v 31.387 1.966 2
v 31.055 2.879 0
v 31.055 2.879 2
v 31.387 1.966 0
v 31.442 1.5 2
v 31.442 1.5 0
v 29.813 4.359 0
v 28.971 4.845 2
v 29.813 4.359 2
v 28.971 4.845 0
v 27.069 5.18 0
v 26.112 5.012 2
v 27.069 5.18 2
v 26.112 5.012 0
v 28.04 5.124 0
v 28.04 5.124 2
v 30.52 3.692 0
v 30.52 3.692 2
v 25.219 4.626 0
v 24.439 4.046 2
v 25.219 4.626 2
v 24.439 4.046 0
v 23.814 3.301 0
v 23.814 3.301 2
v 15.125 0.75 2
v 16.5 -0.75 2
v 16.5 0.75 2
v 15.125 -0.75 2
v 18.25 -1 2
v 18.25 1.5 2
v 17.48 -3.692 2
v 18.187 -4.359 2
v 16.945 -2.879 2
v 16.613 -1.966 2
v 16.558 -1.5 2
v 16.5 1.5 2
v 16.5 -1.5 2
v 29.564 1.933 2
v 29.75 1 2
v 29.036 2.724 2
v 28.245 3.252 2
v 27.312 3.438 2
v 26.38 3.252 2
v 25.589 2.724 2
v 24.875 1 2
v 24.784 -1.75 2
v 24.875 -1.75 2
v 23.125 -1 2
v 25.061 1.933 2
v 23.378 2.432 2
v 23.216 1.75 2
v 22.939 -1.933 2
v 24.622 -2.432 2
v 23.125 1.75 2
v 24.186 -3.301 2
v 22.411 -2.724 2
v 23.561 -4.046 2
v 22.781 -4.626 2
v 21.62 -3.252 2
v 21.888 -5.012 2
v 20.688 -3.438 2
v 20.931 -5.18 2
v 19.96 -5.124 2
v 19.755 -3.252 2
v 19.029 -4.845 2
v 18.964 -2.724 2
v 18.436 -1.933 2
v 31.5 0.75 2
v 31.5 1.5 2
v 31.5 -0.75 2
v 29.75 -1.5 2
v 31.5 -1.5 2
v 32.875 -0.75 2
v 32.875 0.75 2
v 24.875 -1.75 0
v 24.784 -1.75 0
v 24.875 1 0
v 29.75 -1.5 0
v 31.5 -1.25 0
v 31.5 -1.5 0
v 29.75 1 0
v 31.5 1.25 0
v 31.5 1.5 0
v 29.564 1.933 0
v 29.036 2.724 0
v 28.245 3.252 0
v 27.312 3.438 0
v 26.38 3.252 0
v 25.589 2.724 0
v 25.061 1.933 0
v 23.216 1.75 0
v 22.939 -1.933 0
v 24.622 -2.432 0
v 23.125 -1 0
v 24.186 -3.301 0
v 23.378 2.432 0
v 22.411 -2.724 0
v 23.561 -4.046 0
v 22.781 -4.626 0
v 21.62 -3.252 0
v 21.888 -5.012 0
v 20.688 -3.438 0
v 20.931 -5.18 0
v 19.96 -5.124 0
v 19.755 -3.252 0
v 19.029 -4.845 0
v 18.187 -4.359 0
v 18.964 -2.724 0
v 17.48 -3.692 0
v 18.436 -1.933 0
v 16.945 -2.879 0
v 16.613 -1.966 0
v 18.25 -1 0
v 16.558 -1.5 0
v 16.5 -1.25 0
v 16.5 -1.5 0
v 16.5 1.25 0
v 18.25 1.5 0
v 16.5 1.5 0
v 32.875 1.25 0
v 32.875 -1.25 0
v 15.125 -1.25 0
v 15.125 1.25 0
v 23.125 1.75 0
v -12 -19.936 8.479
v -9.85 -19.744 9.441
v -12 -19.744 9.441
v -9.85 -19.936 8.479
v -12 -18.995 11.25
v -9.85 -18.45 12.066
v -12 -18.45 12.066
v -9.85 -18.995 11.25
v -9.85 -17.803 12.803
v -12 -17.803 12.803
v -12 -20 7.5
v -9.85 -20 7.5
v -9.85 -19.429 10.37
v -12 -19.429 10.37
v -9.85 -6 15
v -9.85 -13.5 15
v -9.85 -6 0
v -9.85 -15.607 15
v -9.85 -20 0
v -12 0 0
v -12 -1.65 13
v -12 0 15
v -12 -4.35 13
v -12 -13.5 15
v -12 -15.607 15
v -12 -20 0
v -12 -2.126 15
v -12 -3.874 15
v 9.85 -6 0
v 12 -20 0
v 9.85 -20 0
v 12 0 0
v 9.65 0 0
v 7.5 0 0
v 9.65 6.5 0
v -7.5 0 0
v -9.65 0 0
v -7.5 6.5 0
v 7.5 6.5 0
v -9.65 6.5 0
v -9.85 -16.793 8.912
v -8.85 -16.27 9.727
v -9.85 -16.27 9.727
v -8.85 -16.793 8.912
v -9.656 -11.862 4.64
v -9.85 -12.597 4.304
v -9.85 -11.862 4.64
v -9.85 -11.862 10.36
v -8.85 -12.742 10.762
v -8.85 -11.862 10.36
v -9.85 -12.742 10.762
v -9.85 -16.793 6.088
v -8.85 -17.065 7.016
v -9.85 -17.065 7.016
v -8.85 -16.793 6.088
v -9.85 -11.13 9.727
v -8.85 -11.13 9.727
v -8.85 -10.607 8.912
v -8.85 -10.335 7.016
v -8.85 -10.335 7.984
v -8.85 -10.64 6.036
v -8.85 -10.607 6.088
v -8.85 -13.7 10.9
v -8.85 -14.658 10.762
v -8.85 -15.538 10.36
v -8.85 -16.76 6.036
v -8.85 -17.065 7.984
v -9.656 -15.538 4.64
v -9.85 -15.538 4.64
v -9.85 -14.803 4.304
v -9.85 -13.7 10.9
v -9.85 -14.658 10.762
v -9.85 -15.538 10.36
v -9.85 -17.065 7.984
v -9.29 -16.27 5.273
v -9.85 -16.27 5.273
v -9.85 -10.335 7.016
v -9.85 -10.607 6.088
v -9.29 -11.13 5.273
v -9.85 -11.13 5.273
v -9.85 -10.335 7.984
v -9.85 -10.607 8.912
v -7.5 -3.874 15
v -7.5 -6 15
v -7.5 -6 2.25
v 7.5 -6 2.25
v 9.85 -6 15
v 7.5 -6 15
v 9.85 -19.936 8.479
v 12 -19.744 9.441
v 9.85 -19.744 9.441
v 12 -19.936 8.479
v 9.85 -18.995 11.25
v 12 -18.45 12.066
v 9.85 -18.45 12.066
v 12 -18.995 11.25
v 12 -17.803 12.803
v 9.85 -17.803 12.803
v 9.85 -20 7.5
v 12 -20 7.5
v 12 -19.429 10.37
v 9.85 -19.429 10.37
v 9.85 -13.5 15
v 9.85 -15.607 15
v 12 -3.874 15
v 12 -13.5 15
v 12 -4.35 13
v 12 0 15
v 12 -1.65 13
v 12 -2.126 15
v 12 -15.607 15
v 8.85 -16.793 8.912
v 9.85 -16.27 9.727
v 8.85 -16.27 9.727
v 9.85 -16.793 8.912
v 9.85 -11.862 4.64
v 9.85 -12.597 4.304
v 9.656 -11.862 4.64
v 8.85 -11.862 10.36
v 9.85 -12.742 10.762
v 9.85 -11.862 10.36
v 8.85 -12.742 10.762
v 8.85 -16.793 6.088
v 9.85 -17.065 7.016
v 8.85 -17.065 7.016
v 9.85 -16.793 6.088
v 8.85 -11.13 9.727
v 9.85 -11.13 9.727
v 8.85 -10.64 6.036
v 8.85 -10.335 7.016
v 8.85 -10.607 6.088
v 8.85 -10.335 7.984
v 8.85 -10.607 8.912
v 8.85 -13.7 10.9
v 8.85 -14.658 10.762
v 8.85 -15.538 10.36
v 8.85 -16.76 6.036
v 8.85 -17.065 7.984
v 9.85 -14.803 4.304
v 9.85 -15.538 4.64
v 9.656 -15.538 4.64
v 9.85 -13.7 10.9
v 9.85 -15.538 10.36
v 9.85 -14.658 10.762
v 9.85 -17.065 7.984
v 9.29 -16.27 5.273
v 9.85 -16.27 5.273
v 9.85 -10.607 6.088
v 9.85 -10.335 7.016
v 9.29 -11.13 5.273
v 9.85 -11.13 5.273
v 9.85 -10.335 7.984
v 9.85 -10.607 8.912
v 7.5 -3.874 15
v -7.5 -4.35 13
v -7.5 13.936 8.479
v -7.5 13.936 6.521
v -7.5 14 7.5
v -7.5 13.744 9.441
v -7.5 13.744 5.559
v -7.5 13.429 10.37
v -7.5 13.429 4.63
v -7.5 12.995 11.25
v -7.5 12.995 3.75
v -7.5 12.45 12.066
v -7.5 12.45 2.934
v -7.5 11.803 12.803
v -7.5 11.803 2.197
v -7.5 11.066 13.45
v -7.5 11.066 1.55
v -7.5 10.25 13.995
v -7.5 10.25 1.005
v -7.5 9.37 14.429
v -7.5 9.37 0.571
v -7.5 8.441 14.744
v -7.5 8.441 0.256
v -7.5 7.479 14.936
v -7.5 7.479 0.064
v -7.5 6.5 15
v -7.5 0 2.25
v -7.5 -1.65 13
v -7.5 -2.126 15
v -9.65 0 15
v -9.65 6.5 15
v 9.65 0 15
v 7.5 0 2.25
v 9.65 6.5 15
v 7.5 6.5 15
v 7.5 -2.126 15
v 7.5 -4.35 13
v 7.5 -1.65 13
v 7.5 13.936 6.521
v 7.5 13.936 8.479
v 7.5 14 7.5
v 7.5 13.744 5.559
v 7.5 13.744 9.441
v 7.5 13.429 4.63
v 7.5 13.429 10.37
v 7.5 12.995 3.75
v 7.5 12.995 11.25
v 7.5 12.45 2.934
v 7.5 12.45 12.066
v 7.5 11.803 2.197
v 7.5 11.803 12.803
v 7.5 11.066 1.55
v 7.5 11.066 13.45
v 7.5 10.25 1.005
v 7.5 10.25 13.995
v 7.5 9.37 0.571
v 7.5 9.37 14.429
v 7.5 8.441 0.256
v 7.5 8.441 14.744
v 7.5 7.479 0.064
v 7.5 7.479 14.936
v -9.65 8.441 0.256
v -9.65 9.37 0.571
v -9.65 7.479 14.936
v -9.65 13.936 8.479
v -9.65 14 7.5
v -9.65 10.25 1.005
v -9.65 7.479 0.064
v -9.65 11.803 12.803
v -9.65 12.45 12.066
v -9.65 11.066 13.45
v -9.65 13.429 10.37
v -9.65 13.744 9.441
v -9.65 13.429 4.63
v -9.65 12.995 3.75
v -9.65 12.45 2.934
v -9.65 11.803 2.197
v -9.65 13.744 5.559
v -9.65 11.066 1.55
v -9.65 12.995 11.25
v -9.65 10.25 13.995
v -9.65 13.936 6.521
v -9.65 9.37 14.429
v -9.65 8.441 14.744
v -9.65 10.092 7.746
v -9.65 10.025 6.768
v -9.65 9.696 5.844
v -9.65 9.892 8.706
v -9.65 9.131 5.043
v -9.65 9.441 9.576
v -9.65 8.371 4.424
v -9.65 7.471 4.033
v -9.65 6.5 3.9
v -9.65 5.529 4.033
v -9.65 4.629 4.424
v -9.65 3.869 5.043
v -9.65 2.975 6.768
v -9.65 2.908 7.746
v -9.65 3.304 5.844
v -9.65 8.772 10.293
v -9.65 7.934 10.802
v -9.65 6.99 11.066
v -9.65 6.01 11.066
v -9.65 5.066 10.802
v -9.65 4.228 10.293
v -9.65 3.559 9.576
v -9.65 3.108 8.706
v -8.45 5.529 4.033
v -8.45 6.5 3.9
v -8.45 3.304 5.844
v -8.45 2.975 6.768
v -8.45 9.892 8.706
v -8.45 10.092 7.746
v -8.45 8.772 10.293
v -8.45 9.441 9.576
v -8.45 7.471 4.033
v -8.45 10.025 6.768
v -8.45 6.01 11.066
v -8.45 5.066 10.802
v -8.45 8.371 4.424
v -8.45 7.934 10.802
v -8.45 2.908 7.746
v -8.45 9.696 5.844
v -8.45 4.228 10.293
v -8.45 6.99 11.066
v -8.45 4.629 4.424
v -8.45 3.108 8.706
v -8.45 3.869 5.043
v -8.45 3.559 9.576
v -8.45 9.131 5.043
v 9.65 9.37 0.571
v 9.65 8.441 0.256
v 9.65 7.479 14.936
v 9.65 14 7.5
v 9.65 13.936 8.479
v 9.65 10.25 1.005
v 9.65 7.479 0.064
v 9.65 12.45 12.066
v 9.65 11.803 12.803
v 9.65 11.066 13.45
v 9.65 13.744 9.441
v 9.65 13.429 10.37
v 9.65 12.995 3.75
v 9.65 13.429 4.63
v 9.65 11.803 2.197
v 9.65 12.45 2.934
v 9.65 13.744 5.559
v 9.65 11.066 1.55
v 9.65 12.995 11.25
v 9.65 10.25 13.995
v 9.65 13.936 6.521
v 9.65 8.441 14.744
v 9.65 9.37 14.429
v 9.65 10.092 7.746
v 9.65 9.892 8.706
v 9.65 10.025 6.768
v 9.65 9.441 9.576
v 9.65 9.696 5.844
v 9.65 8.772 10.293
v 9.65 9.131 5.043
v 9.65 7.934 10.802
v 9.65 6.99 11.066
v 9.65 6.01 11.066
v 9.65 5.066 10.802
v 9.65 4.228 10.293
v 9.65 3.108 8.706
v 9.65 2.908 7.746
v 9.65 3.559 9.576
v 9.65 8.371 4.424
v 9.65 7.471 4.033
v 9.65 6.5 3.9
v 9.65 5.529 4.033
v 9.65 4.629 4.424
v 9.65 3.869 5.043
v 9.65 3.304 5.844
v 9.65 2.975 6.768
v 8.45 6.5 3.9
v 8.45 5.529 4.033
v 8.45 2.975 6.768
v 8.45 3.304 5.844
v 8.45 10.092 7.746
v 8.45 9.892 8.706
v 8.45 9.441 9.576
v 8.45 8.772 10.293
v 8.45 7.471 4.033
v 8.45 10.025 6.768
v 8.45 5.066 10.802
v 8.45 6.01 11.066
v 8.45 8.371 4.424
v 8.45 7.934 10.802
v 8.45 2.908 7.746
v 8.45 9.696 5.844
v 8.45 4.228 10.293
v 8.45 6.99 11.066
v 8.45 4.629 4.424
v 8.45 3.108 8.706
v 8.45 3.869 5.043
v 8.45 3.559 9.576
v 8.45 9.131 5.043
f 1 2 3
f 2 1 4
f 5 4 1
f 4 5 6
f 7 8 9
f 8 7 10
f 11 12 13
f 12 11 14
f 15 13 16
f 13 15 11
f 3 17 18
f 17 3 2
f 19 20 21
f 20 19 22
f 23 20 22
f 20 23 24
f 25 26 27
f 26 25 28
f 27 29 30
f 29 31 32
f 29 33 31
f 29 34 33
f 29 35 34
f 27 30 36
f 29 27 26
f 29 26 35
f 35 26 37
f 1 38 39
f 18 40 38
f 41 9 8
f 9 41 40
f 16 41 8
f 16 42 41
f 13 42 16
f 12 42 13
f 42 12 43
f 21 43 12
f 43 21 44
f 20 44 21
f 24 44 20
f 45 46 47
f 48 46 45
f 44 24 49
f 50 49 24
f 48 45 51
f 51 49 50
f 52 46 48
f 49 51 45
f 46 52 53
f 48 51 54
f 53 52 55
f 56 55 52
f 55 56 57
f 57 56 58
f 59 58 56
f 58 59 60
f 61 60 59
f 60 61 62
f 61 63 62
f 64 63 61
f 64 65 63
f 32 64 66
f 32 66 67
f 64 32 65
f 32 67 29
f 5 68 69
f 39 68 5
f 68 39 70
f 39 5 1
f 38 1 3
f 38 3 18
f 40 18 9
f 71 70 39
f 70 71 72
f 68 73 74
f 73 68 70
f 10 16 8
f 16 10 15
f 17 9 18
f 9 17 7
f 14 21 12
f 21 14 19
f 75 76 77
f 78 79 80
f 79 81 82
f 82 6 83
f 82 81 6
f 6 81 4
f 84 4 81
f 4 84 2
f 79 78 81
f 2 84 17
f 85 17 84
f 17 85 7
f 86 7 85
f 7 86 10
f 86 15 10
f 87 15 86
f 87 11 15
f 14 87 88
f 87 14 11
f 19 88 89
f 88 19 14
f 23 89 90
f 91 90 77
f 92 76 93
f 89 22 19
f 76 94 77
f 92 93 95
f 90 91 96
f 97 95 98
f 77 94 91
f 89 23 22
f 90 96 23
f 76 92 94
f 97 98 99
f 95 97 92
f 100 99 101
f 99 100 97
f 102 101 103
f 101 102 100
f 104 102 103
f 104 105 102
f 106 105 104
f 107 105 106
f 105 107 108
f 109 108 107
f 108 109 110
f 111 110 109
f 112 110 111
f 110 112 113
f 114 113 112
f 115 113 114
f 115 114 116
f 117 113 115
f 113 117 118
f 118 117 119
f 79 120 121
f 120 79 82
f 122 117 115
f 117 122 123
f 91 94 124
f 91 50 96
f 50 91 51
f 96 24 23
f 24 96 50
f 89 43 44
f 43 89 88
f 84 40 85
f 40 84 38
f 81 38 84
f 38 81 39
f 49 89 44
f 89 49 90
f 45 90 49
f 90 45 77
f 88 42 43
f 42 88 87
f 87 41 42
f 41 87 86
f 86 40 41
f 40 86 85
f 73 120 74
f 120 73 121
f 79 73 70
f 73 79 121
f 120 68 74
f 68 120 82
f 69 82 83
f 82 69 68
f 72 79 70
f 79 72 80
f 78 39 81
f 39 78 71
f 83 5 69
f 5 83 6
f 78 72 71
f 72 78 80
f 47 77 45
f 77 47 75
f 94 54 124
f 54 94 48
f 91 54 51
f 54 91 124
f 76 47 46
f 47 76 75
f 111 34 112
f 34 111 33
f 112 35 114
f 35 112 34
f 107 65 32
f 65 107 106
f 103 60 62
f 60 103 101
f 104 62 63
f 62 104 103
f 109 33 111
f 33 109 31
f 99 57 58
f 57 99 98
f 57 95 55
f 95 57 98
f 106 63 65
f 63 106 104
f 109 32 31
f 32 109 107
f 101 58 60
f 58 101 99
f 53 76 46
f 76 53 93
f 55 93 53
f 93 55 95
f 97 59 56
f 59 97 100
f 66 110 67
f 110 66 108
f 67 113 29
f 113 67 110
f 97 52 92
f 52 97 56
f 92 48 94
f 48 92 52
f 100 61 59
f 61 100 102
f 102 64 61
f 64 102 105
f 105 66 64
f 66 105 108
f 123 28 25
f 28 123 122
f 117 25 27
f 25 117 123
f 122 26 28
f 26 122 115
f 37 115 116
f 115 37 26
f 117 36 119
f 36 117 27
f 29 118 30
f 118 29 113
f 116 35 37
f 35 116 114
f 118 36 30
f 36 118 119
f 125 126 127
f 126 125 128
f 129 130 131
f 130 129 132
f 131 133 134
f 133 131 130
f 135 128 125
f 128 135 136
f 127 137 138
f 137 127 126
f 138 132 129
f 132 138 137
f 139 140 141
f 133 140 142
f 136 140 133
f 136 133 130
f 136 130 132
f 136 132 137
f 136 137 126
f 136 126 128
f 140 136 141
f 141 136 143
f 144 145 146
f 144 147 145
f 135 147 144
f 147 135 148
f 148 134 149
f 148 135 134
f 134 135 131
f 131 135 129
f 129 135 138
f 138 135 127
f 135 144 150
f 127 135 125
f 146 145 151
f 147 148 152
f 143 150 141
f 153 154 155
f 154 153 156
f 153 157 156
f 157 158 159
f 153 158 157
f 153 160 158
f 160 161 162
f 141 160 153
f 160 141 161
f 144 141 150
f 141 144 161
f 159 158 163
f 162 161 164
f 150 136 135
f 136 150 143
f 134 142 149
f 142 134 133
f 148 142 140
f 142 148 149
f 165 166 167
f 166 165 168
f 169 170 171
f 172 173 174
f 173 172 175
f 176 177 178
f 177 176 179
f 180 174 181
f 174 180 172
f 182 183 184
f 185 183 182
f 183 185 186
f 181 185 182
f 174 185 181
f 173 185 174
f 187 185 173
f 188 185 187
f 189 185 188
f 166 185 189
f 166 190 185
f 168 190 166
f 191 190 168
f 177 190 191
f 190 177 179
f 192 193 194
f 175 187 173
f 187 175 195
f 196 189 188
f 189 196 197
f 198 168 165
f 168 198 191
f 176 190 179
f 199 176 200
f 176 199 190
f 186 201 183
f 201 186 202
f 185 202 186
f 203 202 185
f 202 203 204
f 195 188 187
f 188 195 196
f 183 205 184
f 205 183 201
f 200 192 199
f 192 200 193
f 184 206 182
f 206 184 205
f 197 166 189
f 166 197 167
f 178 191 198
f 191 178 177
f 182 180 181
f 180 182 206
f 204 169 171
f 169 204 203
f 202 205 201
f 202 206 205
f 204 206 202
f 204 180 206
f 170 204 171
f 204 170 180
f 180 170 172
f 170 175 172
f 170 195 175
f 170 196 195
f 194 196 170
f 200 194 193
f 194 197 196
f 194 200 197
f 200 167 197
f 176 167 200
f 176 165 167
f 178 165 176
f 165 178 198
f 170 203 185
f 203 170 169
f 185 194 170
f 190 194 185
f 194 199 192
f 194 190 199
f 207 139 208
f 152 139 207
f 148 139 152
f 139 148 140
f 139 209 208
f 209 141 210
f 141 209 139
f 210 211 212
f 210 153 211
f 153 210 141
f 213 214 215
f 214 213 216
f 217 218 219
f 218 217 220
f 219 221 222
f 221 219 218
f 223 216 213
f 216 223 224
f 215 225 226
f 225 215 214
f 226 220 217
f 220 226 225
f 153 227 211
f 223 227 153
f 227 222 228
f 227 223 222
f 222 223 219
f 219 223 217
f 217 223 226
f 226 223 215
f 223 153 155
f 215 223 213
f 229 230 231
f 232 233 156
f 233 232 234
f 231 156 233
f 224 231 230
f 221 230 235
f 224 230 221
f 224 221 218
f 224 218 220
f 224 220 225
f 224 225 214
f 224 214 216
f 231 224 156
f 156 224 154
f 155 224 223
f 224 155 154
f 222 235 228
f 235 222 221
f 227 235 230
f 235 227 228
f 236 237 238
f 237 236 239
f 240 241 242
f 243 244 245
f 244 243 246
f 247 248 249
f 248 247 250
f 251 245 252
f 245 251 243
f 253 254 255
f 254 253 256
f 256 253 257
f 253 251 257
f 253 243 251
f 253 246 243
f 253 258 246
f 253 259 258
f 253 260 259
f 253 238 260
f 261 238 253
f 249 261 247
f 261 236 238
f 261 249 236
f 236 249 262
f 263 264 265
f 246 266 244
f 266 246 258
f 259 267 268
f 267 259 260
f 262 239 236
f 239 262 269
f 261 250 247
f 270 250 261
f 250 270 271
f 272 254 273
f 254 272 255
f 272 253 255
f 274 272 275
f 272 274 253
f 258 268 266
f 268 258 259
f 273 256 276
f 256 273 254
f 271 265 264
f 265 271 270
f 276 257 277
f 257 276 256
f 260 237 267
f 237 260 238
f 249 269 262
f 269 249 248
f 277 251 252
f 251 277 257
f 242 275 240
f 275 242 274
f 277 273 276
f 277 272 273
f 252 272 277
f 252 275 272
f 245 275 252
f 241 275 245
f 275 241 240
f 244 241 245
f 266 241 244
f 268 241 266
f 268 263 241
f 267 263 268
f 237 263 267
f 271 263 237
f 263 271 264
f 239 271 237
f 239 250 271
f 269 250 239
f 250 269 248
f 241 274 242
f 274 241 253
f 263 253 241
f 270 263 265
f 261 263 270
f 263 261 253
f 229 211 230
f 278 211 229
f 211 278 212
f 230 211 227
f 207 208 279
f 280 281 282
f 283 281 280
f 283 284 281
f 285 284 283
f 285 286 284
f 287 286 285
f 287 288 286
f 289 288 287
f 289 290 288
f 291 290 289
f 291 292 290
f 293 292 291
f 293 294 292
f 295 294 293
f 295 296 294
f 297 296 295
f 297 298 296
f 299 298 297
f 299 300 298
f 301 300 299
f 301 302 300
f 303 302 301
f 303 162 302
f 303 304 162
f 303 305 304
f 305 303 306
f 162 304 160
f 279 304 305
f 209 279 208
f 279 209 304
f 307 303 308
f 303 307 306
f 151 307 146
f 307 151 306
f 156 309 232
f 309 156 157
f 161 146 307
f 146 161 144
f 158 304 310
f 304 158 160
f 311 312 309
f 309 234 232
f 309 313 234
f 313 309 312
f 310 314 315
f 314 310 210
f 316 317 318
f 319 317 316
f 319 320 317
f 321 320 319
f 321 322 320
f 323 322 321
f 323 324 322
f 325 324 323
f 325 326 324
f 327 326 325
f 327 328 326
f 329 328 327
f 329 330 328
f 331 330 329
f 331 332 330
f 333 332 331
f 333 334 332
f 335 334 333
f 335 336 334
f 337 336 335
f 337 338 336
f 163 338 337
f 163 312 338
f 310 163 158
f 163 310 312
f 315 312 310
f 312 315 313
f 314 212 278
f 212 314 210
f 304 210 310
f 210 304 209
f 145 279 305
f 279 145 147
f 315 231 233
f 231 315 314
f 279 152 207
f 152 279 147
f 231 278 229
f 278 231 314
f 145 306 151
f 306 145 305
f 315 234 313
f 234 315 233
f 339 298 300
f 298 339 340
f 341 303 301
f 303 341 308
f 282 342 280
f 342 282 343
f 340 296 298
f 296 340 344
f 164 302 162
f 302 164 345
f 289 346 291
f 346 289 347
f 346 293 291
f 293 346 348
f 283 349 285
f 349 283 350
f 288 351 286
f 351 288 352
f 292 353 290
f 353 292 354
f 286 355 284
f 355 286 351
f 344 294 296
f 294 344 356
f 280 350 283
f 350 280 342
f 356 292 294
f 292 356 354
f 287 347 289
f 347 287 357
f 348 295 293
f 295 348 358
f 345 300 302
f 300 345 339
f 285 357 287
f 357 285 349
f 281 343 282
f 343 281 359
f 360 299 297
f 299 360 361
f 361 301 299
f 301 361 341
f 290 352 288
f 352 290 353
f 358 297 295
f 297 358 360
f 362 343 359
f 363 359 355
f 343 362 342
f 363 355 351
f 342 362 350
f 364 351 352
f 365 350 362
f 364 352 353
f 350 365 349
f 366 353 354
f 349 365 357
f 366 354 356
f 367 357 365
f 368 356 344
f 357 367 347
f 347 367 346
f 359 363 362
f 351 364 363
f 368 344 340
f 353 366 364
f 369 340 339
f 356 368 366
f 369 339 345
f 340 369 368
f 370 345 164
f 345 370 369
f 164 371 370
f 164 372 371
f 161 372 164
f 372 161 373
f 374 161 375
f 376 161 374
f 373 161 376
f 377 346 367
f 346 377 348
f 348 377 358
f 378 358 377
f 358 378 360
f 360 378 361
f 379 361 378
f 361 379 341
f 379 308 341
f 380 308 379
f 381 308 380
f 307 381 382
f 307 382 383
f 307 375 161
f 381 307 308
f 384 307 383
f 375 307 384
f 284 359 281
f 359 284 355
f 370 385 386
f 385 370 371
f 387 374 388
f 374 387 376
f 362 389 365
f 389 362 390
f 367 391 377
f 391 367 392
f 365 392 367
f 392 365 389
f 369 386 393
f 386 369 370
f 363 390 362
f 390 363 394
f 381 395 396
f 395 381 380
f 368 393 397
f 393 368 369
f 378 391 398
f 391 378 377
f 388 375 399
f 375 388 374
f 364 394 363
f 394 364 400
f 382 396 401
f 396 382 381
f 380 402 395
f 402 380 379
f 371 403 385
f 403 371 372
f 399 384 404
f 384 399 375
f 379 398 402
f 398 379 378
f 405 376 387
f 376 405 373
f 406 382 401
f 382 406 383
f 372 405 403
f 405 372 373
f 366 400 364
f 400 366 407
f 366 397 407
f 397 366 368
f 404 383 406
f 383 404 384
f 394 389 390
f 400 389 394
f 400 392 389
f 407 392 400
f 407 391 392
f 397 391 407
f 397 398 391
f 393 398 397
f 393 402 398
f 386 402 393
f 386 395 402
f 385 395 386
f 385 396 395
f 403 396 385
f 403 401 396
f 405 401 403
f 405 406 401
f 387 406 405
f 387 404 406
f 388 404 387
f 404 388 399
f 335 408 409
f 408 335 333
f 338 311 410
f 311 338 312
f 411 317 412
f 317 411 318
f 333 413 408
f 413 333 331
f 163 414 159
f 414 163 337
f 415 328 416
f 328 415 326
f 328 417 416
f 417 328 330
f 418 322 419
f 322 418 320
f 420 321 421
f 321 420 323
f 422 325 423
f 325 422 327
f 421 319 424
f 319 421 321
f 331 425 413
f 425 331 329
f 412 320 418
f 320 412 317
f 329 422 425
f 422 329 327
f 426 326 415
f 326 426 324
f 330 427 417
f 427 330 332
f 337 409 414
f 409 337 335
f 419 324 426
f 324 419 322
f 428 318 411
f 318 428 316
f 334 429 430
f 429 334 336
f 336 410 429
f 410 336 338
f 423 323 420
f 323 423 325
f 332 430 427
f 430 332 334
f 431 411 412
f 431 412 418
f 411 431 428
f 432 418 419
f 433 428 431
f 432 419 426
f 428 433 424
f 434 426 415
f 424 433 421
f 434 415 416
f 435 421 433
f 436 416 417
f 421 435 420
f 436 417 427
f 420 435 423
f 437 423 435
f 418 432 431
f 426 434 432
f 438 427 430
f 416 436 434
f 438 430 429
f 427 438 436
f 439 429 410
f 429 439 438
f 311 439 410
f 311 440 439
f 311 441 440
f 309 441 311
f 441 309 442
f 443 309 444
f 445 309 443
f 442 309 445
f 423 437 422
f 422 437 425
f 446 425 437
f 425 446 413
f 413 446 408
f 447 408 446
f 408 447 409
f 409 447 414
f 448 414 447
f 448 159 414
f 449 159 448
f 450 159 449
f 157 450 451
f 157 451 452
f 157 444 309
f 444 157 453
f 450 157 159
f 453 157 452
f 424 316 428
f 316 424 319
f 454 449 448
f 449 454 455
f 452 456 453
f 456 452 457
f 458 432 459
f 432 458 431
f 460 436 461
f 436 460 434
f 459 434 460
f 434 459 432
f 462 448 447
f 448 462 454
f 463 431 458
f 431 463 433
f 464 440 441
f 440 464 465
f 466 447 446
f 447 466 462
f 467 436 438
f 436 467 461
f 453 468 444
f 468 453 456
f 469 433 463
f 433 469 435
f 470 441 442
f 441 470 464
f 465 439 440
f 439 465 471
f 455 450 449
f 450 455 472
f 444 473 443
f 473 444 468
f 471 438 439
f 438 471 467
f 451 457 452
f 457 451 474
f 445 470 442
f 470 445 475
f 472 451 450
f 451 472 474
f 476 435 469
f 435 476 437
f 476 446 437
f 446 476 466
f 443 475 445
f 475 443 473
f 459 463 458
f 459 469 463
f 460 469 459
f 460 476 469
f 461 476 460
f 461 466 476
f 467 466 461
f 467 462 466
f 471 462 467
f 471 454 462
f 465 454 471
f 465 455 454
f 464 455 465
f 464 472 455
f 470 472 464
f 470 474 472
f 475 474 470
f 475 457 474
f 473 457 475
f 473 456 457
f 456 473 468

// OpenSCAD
// file: parameters.scad
tolerance = .2;

outer_width = 24;
outer_height = 15;

mid_depth = 6;

wall_thickness = 2.25;

key_diameter = 7;
key_depth = 1.1;

clip_thickness = 2;
clip_curve_thickness = 1.75;

_trim = 1;

$fa = 3;
$fs = 1;
// main file
include<parameters.scad>;

module notch_profile(with_tolerance=false) {
    polygon([
        [clip_thickness,
         -1.25 - (with_tolerance ? tolerance/2 : 0)],
        [(with_tolerance ? -.1 : 0),
         -.75 - (with_tolerance ? tolerance/2 : 0)],
        [(with_tolerance ? -.1 : 0),
         .75 + (with_tolerance ? tolerance/2 : 0)],
        [clip_thickness,
         1.25 + (with_tolerance ? tolerance/2 : 0)]
    ]);
}

module link_back() {
    union()
    translate([0, 0, outer_height/2])
    for(n=[0, 1])
    mirror([n, 0, 0])
    translate([-outer_width/2, 0, 0])
    union() {
        translate([0, _trim, 0])
        union() {
            difference() {
                translate([0, -outer_height/2, 0])
                rotate([0, 90, 0])
                cylinder(d=outer_height, h=wall_thickness-tolerance/2);

                translate([-.1, -outer_height/2, -outer_height/2])
                cube([wall_thickness+.2, outer_height/2, outer_height]);
            }

            translate([0, -outer_height, -outer_height/2])
            cube([wall_thickness-tolerance/2, outer_height/2, outer_height/2]);

            radius = (outer_height/2);
            translate([0, -(radius*(1+cos(45))), radius*sin(45)])
            rotate([90, 0, 90])
            linear_extrude(height=wall_thickness-tolerance/2)
            polygon([
                [0, 0],
                [radius*(1-sin(45)), radius*(1-sin(45))],
                [radius*cos(45), radius*(1-sin(45))],
                [radius*cos(45), 0]
            ]);
        }

        translate([0, -outer_height/2, -outer_height/2])
        cube([wall_thickness-tolerance/2, outer_height/2, outer_height]);

        // key
        translate([0, -outer_height/2-tolerance, 0])
        rotate([0, 90, 0])
        translate([0, 0, wall_thickness-.1])
        difference() {
            cylinder(d=key_diameter-tolerance, h=key_depth+.1-tolerance);

            translate([-2, -5, 3])
            rotate([0, 30, 0])
            cube([10,10,1]);
        }
    }
}

module link_mid() {
    translate([0, -mid_depth, 0])
    difference() {
        union() {
            translate([0, 0, outer_height/2])
            for(n=[0, 1])
            mirror([n, 0, 0])
            translate([-outer_width/2, 0, -outer_height/2])
            cube([wall_thickness * 2, mid_depth, outer_height]);

            translate([-outer_width/2, 0, 0])
            cube([outer_width, mid_depth, wall_thickness]);
        }

        translate([-outer_width/2-.5, mid_depth/2, outer_height])
        rotate([0, 90, 0])
        linear_extrude(height=outer_width+1)
        notch_profile(true);
    }
}

module link_front() {
    union()
    translate([0, 0, outer_height/2])
    for(n=[0, 1])
    mirror([n, 0, 0])
    translate([-outer_width/2 + wall_thickness, 0, 0])
    difference() {
        union() {
            translate([0, -_trim, 0])
            difference() {
                translate([tolerance/2, outer_height/2, 0])
                rotate([0, 90, 0])
                cylinder(d=outer_height, h=wall_thickness-tolerance/2);

                translate([tolerance-.1, 0, -outer_height/2])
                cube([wall_thickness-tolerance+.2, outer_height/2, outer_height]);
            }

            translate([tolerance/2, 0, -outer_height/2])
            cube([wall_thickness-tolerance/2, outer_height/2-_trim, outer_height]);
        }

        // keyhole
        translate([0, outer_height/2-_trim, 0])
        rotate([0, 90, 0])
        translate([0, 0, -.1])
        cylinder(d=key_diameter+tolerance, h=key_depth+.1+tolerance);
    }
}

module clip() {
    union() {
        for(r=[0, 180])
        rotate([0, 0, r]) {
            translate([outer_width/2-wall_thickness*2.5, 0, clip_thickness])
            rotate([0, 90, 0])
            linear_extrude(height=wall_thickness+.25)
            notch_profile(false);

            translate([outer_width/2-wall_thickness*2-clip_curve_thickness, -1.5, 0])
            cube([clip_curve_thickness, 3, clip_thickness]);

            translate([-clip_curve_thickness/2, -clip_curve_thickness, 0])
            cube([clip_curve_thickness, clip_curve_thickness*2, clip_thickness]);

            cyl_radius=(outer_width-wall_thickness*4+clip_curve_thickness)/4;

            translate([cyl_radius-clip_curve_thickness/2, 1, 0])
            difference() {
                cylinder(r=cyl_radius, h=clip_thickness);

                translate([0, 0, -.1])
                cylinder(r=cyl_radius-clip_curve_thickness, h=clip_thickness+.2);

                translate([-outer_width/2, -outer_width/2, -.1])
                cube([outer_width, outer_width/2, clip_thickness + .2]);
            }
        }
    }
}

module full_link() {
    union() {
        translate([0, -mid_depth, 0])
        link_back();
        link_mid();
        link_front();
    }
}

//translate([0, -mid_depth/2, outer_height-clip_thickness])
translate([outer_width, 0, 0])
clip();

full_link();
